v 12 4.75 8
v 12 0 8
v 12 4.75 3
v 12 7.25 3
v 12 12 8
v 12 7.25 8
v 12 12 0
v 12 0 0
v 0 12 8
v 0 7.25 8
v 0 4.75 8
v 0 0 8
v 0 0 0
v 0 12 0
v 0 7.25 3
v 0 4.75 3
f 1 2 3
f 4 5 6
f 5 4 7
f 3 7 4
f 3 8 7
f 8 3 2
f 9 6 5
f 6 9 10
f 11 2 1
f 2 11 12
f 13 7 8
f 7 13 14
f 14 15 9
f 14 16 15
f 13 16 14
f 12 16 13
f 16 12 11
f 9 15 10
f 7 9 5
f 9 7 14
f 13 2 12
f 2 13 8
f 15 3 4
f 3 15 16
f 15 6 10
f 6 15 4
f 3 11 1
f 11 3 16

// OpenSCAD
$fn = 32;

// ----------------------------------------------------------------------
// Micro clip: slotted block, 5-20 mm class
// ----------------------------------------------------------------------

// --- parameters (mm) ---
block_l = 12;             // block length, X
block_w = 12;             // block width, Y
block_h = 8;              // block height, Z
slot_w = 2.5;             // slot width
slot_d = 5;               // slot depth from the top
fit_tol = 0.1;            // tolerance for press fits, mm
free_tol = 0.5;           // tolerance for clearance fits, mm

difference() {
  cube([block_l, block_w, block_h]);
  translate([-1, block_w / 2 - slot_w / 2, block_h - slot_d])
    cube([block_l + 2, slot_w, slot_d + 1]);
}
